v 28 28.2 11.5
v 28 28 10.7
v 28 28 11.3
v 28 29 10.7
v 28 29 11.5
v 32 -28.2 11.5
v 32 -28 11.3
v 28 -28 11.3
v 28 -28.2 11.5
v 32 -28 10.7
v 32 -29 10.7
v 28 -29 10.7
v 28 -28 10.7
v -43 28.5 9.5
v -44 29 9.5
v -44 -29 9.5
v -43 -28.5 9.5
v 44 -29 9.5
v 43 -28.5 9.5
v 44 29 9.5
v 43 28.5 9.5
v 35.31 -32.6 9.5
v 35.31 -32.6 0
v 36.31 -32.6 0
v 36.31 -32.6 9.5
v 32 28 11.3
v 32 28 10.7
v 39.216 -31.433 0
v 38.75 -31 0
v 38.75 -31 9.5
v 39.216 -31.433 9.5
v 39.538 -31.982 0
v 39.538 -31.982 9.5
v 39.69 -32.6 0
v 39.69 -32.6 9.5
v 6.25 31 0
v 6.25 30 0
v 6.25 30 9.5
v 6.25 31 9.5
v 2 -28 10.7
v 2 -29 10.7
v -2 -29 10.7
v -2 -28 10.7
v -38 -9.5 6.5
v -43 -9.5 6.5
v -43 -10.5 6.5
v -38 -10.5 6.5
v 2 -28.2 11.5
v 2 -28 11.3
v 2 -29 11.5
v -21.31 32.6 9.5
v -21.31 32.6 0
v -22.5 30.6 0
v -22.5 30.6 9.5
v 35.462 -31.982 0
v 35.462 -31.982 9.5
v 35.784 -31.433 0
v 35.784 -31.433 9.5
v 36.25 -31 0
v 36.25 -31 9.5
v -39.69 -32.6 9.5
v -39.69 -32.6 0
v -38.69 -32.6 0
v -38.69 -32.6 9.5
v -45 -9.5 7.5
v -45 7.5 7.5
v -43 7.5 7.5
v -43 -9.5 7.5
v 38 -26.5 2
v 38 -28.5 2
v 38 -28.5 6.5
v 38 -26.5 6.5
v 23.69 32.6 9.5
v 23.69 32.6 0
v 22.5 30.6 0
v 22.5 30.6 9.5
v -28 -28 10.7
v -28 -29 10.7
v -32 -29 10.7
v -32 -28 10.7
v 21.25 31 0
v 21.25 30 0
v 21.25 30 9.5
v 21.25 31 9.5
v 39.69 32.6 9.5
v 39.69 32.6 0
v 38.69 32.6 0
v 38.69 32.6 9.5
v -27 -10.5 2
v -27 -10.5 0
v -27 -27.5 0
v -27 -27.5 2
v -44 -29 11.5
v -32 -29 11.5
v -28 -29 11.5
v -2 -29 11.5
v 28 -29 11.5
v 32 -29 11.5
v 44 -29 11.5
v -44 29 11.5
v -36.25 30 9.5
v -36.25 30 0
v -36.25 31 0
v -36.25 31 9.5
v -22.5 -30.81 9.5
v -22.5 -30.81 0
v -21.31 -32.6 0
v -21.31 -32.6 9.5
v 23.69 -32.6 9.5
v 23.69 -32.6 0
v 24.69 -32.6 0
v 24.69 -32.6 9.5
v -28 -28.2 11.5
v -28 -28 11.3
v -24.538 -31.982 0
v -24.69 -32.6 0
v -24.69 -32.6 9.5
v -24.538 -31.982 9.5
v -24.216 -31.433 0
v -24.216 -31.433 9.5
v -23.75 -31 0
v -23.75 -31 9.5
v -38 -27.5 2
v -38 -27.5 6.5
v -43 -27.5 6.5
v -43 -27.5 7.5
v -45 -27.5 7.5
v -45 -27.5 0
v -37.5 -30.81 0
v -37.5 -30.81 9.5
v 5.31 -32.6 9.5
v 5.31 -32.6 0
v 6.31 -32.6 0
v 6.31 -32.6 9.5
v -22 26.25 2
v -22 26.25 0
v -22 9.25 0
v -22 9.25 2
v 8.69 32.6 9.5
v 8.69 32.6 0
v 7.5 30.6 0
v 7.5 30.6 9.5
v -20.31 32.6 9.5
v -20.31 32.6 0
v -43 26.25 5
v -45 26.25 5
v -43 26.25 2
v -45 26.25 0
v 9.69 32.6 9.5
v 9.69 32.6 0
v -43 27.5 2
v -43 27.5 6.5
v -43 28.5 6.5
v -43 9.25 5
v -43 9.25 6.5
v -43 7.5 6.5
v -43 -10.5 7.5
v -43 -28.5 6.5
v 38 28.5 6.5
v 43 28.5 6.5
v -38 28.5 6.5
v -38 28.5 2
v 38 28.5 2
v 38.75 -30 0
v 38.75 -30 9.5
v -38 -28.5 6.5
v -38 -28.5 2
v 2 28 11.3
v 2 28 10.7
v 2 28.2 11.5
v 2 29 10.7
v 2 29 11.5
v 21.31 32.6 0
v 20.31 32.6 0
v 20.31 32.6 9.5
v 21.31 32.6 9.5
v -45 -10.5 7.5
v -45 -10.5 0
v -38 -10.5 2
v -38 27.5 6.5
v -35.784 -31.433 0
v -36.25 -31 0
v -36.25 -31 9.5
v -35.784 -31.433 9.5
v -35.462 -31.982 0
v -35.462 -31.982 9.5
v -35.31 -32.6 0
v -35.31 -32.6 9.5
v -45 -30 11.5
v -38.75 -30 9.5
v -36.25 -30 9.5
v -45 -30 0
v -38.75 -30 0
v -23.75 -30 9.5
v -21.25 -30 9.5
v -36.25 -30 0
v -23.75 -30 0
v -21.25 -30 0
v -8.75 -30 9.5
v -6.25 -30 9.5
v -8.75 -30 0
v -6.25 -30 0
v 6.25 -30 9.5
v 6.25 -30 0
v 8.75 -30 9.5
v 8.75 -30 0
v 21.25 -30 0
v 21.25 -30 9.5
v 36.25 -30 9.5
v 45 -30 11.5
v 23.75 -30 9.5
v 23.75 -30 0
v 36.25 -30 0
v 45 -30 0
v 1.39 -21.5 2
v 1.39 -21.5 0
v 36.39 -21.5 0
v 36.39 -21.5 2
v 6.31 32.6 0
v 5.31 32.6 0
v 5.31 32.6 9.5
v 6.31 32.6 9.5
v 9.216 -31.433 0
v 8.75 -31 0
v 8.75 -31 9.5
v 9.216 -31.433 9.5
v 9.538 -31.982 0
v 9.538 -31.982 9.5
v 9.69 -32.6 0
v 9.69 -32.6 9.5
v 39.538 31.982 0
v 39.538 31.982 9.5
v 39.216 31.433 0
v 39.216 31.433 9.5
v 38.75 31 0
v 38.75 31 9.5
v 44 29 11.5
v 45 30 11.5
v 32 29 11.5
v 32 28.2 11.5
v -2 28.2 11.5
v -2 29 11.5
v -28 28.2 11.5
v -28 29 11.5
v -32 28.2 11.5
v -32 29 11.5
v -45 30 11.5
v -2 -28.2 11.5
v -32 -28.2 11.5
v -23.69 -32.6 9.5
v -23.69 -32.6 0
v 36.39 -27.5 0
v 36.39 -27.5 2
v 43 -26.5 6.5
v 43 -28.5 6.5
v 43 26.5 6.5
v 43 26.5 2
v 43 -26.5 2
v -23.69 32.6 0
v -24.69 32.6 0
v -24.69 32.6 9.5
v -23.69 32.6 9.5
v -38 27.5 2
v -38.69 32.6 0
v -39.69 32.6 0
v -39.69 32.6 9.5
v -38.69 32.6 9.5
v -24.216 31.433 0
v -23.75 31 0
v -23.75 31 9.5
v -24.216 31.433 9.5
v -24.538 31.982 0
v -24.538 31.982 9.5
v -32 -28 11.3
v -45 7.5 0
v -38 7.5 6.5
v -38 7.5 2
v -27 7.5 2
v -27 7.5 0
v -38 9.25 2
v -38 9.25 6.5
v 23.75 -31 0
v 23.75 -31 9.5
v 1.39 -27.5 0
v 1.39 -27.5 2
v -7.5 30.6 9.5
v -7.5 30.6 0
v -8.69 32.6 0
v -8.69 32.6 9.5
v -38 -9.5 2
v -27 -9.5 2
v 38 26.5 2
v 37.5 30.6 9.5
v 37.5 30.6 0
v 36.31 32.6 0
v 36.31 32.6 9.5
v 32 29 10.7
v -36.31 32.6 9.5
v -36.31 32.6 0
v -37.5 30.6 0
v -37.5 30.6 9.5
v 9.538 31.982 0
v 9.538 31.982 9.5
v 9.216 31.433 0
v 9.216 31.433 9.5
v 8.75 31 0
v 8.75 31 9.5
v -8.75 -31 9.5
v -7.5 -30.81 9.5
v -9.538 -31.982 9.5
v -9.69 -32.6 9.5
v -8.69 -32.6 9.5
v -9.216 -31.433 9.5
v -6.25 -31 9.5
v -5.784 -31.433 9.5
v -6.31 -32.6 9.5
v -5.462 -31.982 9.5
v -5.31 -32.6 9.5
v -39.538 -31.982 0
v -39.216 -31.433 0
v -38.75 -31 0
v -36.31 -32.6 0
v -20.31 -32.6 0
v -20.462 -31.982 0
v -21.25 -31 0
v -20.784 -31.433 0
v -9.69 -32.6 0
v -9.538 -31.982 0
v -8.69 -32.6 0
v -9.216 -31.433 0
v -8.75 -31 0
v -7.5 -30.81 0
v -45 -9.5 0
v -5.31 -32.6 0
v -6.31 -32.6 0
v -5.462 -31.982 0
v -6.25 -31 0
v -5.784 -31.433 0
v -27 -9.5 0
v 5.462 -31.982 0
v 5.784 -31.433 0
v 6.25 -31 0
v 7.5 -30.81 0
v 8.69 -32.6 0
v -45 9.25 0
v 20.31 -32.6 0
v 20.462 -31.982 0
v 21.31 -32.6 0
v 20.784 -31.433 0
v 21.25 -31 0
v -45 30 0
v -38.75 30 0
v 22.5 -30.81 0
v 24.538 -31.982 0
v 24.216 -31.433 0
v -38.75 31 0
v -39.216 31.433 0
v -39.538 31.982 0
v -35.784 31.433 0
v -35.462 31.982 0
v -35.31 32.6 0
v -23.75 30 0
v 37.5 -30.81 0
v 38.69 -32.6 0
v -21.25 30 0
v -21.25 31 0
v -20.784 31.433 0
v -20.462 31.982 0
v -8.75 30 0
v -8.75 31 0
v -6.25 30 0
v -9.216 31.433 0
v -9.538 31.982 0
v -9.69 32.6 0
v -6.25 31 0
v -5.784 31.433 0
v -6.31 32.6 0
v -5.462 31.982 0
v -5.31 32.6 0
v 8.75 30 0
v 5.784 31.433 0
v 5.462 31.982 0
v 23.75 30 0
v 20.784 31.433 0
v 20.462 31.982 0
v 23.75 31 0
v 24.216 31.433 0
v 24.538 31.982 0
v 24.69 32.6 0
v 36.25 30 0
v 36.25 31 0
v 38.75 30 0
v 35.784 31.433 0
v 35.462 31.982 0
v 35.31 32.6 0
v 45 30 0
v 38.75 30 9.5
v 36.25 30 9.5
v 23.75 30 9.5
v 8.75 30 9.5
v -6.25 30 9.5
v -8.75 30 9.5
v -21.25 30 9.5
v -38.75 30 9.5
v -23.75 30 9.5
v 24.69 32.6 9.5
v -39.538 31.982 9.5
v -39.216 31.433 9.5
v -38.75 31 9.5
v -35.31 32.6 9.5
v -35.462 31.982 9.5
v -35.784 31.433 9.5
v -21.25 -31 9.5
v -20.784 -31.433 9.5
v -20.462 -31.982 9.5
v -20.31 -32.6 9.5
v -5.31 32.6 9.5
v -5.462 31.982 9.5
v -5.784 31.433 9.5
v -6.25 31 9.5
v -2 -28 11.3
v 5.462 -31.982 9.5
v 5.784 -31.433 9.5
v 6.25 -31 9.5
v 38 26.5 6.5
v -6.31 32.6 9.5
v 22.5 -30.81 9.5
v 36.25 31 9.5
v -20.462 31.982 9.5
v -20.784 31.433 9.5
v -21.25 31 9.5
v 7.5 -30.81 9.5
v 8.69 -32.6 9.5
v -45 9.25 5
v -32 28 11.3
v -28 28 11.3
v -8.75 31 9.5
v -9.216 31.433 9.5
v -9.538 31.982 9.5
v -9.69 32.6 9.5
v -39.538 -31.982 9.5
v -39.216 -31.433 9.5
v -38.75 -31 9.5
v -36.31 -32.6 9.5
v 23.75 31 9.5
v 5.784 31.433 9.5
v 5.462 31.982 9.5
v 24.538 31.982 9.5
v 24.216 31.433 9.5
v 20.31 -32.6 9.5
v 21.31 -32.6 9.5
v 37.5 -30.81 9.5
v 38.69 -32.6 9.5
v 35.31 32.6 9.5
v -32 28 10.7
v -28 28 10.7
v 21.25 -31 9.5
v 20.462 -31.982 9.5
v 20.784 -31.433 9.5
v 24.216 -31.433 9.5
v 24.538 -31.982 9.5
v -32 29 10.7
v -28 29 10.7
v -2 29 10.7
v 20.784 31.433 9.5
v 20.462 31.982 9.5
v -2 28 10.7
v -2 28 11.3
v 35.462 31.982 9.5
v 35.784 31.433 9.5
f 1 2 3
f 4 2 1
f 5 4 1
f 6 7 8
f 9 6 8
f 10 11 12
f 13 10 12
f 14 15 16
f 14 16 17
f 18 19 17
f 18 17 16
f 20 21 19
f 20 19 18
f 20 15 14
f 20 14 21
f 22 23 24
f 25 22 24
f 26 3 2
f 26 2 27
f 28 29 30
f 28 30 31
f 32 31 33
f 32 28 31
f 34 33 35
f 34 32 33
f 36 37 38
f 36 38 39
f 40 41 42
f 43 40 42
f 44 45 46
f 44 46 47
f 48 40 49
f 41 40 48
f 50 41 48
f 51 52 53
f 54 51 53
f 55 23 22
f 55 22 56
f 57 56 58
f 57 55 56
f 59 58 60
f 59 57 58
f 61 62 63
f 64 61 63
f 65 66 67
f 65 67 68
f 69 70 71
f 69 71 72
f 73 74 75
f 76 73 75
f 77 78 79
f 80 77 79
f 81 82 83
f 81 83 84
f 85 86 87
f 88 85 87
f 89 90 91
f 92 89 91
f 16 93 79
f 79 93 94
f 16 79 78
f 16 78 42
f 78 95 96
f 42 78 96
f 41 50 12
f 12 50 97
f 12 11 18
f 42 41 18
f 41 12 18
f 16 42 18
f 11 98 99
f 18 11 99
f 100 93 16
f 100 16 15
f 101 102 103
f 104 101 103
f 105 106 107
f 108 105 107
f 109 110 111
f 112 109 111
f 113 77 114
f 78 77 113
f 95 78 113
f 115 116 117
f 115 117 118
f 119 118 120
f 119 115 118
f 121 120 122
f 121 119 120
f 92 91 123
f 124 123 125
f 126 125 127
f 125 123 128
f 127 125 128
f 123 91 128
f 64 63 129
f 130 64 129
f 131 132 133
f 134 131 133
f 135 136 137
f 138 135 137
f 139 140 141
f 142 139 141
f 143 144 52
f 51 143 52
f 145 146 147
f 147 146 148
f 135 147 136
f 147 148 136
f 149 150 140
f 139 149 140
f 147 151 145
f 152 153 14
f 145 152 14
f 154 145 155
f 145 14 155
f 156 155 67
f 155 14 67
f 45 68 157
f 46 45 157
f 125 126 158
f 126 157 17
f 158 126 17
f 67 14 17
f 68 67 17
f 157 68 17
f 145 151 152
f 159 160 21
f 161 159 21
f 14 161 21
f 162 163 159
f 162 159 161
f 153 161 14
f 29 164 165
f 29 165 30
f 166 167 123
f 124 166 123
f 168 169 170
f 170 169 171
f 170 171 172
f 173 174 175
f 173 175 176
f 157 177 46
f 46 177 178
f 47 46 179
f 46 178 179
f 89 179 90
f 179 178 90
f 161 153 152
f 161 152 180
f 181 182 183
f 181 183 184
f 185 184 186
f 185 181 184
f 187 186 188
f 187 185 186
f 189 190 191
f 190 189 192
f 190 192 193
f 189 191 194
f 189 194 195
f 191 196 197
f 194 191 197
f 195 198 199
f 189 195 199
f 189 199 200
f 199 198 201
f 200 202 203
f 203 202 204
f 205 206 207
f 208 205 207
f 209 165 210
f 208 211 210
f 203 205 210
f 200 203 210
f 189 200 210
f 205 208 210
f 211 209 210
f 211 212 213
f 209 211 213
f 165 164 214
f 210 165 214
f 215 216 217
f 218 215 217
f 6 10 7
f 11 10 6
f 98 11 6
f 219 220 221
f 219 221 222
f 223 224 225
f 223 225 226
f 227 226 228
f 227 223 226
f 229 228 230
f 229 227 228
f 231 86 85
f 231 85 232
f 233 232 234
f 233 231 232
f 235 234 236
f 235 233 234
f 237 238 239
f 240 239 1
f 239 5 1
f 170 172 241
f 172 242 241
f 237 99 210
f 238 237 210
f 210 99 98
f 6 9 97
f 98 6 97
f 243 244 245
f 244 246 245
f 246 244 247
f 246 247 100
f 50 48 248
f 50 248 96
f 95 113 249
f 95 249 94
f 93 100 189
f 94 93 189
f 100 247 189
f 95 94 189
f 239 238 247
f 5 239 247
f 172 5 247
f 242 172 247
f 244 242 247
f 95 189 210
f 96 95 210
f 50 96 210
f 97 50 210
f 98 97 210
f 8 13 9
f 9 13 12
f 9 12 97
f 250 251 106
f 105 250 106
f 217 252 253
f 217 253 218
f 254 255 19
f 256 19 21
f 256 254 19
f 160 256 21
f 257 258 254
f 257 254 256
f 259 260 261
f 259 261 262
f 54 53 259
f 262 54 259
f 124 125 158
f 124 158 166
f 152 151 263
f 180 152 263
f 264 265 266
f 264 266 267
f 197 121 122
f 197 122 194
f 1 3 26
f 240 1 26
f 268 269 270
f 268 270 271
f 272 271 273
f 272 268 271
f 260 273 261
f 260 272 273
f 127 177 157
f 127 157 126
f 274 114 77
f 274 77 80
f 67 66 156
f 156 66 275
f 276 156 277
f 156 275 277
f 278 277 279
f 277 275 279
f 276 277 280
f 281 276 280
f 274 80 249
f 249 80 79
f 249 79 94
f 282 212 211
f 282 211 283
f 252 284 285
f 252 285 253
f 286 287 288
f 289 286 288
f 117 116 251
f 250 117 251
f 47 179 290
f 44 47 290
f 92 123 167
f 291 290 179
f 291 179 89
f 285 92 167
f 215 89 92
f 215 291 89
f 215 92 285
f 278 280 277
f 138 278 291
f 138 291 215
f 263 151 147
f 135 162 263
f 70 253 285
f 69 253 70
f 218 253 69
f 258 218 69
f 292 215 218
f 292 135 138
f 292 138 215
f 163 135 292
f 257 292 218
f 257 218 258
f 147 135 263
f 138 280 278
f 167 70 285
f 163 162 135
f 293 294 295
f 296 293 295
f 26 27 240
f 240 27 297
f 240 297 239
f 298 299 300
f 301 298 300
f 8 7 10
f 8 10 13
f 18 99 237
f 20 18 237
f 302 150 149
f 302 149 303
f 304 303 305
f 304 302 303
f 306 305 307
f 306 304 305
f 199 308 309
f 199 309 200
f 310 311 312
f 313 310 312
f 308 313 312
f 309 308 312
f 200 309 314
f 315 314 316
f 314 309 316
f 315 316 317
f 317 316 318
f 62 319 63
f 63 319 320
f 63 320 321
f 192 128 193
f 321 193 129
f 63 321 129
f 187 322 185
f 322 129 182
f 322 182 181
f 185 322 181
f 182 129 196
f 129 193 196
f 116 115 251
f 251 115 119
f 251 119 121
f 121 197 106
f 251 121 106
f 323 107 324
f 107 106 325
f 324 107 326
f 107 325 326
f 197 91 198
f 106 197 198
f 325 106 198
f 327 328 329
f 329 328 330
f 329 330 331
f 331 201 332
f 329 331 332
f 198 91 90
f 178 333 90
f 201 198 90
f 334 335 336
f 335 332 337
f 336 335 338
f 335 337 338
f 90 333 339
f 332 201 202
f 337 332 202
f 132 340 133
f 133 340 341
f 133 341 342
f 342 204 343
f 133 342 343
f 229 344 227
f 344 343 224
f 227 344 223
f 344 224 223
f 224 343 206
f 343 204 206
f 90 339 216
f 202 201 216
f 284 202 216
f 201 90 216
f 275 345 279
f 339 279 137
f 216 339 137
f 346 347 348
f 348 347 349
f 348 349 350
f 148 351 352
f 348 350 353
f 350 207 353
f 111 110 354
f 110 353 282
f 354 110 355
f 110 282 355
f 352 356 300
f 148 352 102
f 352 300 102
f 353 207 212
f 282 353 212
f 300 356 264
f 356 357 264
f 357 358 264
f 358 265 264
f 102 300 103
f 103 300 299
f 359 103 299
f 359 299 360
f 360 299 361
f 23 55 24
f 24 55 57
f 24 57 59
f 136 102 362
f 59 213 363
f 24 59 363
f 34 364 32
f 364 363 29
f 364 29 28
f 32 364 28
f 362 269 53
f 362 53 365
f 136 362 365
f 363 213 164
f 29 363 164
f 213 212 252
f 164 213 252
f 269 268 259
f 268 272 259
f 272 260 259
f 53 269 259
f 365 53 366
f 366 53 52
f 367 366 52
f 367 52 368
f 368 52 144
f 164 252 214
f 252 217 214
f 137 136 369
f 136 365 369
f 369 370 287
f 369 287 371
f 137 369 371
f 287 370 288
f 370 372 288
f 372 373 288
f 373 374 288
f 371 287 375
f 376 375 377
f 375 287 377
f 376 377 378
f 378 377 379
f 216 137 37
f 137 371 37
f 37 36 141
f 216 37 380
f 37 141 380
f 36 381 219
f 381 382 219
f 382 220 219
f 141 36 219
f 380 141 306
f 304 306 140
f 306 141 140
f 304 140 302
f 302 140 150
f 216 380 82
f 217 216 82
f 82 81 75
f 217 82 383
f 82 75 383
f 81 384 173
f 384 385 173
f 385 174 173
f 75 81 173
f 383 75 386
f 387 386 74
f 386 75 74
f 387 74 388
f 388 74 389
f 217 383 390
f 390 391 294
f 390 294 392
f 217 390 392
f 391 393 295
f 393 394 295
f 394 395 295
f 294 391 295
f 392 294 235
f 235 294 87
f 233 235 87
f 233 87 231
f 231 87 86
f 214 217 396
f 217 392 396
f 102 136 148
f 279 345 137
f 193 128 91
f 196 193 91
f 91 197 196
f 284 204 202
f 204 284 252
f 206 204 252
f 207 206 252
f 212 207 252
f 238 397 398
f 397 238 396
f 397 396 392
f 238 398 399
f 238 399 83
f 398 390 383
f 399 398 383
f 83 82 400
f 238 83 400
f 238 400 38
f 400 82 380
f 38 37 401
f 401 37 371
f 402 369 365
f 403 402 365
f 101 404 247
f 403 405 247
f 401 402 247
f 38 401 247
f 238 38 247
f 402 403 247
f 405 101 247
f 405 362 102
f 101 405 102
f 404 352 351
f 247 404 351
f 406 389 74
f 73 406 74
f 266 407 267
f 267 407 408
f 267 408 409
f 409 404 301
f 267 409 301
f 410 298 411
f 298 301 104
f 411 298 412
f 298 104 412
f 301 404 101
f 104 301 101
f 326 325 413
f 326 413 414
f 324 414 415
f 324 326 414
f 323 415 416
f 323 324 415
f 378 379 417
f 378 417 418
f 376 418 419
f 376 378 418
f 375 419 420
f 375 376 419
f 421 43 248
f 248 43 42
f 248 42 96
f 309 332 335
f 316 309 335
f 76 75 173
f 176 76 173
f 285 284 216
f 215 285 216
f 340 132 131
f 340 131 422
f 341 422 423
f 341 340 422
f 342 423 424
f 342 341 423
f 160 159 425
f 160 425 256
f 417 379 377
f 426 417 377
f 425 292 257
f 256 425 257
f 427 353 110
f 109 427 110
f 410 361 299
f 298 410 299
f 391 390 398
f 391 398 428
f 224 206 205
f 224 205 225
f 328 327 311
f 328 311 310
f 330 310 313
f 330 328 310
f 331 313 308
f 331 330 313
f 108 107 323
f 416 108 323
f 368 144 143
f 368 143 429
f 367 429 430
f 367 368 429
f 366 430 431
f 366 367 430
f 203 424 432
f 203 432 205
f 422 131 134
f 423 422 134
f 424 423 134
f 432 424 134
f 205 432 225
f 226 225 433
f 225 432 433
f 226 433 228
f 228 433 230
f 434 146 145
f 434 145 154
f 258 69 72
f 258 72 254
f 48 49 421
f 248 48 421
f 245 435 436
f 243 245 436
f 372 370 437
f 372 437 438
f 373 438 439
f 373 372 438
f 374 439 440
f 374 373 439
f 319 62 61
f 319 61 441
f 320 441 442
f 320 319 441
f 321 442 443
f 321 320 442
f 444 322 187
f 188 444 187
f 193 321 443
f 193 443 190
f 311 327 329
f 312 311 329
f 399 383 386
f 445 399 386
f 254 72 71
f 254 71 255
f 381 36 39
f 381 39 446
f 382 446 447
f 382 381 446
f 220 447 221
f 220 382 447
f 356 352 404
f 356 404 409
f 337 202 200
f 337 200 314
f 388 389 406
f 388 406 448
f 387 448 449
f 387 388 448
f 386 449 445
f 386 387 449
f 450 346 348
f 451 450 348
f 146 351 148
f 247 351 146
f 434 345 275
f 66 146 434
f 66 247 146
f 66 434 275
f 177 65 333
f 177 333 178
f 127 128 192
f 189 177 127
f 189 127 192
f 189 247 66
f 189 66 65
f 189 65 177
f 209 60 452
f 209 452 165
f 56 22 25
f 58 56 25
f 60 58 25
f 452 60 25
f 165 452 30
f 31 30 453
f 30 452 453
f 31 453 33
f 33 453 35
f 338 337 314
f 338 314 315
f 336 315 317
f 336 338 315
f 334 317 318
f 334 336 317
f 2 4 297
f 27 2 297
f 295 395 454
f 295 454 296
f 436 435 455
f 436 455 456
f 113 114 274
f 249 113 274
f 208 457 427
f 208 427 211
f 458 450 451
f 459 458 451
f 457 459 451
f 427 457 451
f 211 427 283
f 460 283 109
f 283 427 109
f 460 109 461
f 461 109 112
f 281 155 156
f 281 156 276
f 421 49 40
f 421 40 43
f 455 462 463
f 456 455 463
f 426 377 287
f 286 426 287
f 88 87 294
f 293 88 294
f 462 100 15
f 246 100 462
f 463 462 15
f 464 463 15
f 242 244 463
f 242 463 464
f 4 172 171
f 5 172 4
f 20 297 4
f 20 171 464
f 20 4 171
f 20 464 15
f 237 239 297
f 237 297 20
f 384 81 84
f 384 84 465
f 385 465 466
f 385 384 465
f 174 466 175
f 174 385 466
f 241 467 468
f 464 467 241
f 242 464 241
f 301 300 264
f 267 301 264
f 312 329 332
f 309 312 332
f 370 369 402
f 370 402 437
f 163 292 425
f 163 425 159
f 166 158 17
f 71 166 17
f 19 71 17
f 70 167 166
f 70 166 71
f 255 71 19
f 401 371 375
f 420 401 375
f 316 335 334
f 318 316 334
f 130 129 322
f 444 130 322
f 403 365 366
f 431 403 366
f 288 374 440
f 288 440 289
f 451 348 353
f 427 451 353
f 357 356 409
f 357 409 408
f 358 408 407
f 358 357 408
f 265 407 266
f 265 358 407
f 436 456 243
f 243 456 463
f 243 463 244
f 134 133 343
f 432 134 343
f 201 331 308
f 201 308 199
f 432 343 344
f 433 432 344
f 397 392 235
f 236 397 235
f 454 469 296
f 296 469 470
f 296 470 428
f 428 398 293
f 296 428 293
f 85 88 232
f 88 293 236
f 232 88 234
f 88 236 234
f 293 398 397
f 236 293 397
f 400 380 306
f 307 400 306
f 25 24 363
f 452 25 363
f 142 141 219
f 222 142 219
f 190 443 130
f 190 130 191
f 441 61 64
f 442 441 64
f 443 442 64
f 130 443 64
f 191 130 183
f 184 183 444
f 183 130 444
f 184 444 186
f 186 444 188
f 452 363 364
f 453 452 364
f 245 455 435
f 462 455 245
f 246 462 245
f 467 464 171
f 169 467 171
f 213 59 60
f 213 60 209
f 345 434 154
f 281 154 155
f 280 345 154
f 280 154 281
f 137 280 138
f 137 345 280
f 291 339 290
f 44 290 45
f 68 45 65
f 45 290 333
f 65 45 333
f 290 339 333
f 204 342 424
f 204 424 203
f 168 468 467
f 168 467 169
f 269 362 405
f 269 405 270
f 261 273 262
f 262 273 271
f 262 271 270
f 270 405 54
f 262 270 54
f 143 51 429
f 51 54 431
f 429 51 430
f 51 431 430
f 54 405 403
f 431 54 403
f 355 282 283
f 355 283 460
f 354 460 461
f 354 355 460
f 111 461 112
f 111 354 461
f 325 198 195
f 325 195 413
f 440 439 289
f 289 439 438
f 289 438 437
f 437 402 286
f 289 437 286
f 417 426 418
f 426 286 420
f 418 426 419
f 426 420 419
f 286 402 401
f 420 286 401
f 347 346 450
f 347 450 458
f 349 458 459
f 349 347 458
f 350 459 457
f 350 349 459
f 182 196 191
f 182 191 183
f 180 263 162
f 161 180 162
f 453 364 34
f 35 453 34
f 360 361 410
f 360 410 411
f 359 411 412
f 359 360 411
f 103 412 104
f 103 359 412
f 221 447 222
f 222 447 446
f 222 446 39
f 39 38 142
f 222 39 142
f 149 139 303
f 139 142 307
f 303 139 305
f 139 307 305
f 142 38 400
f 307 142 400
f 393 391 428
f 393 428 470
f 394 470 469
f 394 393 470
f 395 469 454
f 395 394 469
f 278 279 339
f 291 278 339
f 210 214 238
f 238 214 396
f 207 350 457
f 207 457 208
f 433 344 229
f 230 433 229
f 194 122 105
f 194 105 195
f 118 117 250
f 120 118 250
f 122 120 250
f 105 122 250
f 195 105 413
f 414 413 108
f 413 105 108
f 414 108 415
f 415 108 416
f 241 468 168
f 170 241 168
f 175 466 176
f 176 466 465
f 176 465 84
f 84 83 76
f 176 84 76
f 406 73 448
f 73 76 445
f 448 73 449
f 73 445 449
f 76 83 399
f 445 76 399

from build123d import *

# Parameters (mm, degrees)
SKETCH_W            = 35
SKETCH_H            = 6
PAD_DEPTH           = 2
SKETCH001_W         = 2
SKETCH001_H         = 1.75
SKETCH001_H_2       = 1
PAD001_DEPTH        = 9.5
SKETCH002_W         = 17
SKETCH002_H         = 6.5
SKETCH002_H_2       = 4
PAD002_DEPTH        = 2
SKETCH003_W         = 5
SKETCH003_H         = 1
SKETCH003_H_2       = 1.75
SKETCH003_H_3       = 2
PAD003_DEPTH        = 4.5
SKETCH004_W         = 88
SKETCH004_H         = 58
POCKET_DEPTH        = 2
SKETCH005_W         = 4
SKETCH005_H         = 0.8
PAD004_DEPTH        = 1
SKETCH006_W         = 4
SKETCH006_H         = 0.8
PAD005_DEPTH        = 1
PAD006_DEPTH        = 9.5
LINEARPATTERN_COUNT = 6
LINEARPATTERN_PITCH = 15
CHAMFER_SIZE        = 0.2


with BuildPart() as part:
    # Sketch → Pad (new body)
    with BuildSketch(Plane.XY):
        Polygon((-45, 30), (-45, 26.25), (-22, 26.25), (-22, 9.25), (-45, 9.25), (-45, 7.5), (-27, 7.5), (-27, -9.5), (-45, -9.5), (-45, -10.5), (-27, -10.5), (-27, -27.5), (-45, -27.5), (-45, -30), (45, -30), (45, 30), align=None)
        with Locations((18.89, -24.5)):
            Rectangle(SKETCH_W, SKETCH_H, mode=Mode.SUBTRACT)
    extrude(amount=PAD_DEPTH)

    # Sketch001 → Pad001 (new body)
    with BuildSketch(Plane.XY.offset(2)):
        with Locations((-44, 8.375)):
            Rectangle(SKETCH001_W, SKETCH001_H)
        with Locations((-44, -10)):
            Rectangle(SKETCH001_W, SKETCH001_H_2)
        Polygon((-45, -27.5), (-43, -27.5), (-43, -28.5), (43, -28.5), (43, 28.5), (-43, 28.5), (-43, 26.25), (-45, 26.25), (-45, 30), (45, 30), (45, -30), (-45, -30), align=None)
    extrude(amount=PAD001_DEPTH)

    # Sketch002 → Pad002 (new body)
    with BuildSketch(Plane(origin=(-45, 0, 0), x_dir=(0, -1, 0), z_dir=(-1, 0, 0))):
        with Locations((-17.75, 8.25)):
            Rectangle(SKETCH002_W, SKETCH002_H)
        with Locations((1, 9.5)):
            Rectangle(SKETCH002_W, SKETCH002_H_2)
        with Locations((19, 9.5)):
            Rectangle(SKETCH002_W, SKETCH002_H_2)
    extrude(amount=-PAD002_DEPTH)

    # Sketch003 → Pad003 (new body)
    with BuildSketch(Plane.XY.offset(2)):
        with Locations((-40.5, 28)):
            Rectangle(SKETCH003_W, SKETCH003_H)
        with Locations((-40.5, 8.375)):
            Rectangle(SKETCH003_W, SKETCH003_H_2)
        with Locations((-40.5, -10)):
            Rectangle(SKETCH003_W, SKETCH003_H)
        with Locations((-40.5, -28)):
            Rectangle(SKETCH003_W, SKETCH003_H)
        with Locations((40.5, -27.5)):
            Rectangle(SKETCH003_W, SKETCH003_H_3)
        with Locations((40.5, 27.5)):
            Rectangle(SKETCH003_W, SKETCH003_H_3)
    extrude(amount=PAD003_DEPTH)

    # Sketch004 → Pocket (cut)
    with BuildSketch(Plane.XY.offset(11.5)):
        Rectangle(SKETCH004_W, SKETCH004_H)
    extrude(amount=-POCKET_DEPTH, mode=Mode.SUBTRACT)

    # Sketch005 → Pad004 (new body)
    with BuildSketch(Plane.XZ.offset(-29)):
        with Locations((-30, 11.1)):
            Rectangle(SKETCH005_W, SKETCH005_H)
        with Locations((0, 11.1)):
            Rectangle(SKETCH005_W, SKETCH005_H)
        with Locations((30, 11.1)):
            Rectangle(SKETCH005_W, SKETCH005_H)
    extrude(amount=PAD004_DEPTH)

    # Sketch006 → Pad005 (new body)
    with BuildSketch(Plane(origin=(0, -29, 0), x_dir=(-1, 0, 0), z_dir=(0, 1, 0))):
        with Locations((-30, 11.1)):
            Rectangle(SKETCH006_W, SKETCH006_H)
        with Locations((0, 11.1)):
            Rectangle(SKETCH006_W, SKETCH006_H)
        with Locations((30, 11.1)):
            Rectangle(SKETCH006_W, SKETCH006_H)
    extrude(amount=PAD005_DEPTH)

    # Sketch007 → Pad006 (new body)
    with BuildSketch(Plane(origin=(0, 0, 0), x_dir=(1, 0, 0), z_dir=(0, 0, -1))):
        with BuildLine():
            Line((36.25, 31), (36.25, 30))
            Line((36.25, 30), (38.75, 30))
            Line((38.75, 30), (38.75, 31))
            ThreePointArc((38.75, 31), (39.396907, 31.696052), (39.689917, 32.6))
            Line((38.689917, 32.6), (39.689917, 32.6))
            Line((37.5, 30.810387), (38.689917, 32.6))
            Line((36.310083, 32.6), (37.5, 30.810387))
            Line((35.310083, 32.6), (36.310083, 32.6))
            ThreePointArc((35.310083, 32.6), (35.603093, 31.696052), (36.25, 31))
        make_face()
        with BuildLine():
            Line((36.25, -30), (36.25, -31))
            ThreePointArc((36.25, -31), (35.603093, -31.696052), (35.310083, -32.6))
            Line((35.310083, -32.6), (36.310083, -32.6))
            Line((37.5, -30.6), (36.310083, -32.6))
            Line((38.689917, -32.6), (37.5, -30.6))
            Line((39.689917, -32.6), (38.689917, -32.6))
            ThreePointArc((39.689917, -32.6), (39.396907, -31.696052), (38.75, -31))
            Line((38.75, -30), (38.75, -31))
            Line((36.25, -30), (38.75, -30))
        make_face()
    pad006 = extrude(amount=-PAD006_DEPTH)

    # LinearPattern: Pad006 ×6
    with Locations(*[(-i * LINEARPATTERN_PITCH, 0, 0) for i in range(1, LINEARPATTERN_COUNT)]):
        add(pad006)

    # Chamfer
    chamfer_edges = [part.edges().sort_by_distance(p)[0] for p in [
        (0, 28, 11.5),
        (-30, 28, 11.5),
        (30, 28, 11.5),
        (-30, -28, 11.5),
        (0, -28, 11.5),
        (30, -28, 11.5),
    ]]
    chamfer(chamfer_edges, length=CHAMFER_SIZE)


solid = part.part
